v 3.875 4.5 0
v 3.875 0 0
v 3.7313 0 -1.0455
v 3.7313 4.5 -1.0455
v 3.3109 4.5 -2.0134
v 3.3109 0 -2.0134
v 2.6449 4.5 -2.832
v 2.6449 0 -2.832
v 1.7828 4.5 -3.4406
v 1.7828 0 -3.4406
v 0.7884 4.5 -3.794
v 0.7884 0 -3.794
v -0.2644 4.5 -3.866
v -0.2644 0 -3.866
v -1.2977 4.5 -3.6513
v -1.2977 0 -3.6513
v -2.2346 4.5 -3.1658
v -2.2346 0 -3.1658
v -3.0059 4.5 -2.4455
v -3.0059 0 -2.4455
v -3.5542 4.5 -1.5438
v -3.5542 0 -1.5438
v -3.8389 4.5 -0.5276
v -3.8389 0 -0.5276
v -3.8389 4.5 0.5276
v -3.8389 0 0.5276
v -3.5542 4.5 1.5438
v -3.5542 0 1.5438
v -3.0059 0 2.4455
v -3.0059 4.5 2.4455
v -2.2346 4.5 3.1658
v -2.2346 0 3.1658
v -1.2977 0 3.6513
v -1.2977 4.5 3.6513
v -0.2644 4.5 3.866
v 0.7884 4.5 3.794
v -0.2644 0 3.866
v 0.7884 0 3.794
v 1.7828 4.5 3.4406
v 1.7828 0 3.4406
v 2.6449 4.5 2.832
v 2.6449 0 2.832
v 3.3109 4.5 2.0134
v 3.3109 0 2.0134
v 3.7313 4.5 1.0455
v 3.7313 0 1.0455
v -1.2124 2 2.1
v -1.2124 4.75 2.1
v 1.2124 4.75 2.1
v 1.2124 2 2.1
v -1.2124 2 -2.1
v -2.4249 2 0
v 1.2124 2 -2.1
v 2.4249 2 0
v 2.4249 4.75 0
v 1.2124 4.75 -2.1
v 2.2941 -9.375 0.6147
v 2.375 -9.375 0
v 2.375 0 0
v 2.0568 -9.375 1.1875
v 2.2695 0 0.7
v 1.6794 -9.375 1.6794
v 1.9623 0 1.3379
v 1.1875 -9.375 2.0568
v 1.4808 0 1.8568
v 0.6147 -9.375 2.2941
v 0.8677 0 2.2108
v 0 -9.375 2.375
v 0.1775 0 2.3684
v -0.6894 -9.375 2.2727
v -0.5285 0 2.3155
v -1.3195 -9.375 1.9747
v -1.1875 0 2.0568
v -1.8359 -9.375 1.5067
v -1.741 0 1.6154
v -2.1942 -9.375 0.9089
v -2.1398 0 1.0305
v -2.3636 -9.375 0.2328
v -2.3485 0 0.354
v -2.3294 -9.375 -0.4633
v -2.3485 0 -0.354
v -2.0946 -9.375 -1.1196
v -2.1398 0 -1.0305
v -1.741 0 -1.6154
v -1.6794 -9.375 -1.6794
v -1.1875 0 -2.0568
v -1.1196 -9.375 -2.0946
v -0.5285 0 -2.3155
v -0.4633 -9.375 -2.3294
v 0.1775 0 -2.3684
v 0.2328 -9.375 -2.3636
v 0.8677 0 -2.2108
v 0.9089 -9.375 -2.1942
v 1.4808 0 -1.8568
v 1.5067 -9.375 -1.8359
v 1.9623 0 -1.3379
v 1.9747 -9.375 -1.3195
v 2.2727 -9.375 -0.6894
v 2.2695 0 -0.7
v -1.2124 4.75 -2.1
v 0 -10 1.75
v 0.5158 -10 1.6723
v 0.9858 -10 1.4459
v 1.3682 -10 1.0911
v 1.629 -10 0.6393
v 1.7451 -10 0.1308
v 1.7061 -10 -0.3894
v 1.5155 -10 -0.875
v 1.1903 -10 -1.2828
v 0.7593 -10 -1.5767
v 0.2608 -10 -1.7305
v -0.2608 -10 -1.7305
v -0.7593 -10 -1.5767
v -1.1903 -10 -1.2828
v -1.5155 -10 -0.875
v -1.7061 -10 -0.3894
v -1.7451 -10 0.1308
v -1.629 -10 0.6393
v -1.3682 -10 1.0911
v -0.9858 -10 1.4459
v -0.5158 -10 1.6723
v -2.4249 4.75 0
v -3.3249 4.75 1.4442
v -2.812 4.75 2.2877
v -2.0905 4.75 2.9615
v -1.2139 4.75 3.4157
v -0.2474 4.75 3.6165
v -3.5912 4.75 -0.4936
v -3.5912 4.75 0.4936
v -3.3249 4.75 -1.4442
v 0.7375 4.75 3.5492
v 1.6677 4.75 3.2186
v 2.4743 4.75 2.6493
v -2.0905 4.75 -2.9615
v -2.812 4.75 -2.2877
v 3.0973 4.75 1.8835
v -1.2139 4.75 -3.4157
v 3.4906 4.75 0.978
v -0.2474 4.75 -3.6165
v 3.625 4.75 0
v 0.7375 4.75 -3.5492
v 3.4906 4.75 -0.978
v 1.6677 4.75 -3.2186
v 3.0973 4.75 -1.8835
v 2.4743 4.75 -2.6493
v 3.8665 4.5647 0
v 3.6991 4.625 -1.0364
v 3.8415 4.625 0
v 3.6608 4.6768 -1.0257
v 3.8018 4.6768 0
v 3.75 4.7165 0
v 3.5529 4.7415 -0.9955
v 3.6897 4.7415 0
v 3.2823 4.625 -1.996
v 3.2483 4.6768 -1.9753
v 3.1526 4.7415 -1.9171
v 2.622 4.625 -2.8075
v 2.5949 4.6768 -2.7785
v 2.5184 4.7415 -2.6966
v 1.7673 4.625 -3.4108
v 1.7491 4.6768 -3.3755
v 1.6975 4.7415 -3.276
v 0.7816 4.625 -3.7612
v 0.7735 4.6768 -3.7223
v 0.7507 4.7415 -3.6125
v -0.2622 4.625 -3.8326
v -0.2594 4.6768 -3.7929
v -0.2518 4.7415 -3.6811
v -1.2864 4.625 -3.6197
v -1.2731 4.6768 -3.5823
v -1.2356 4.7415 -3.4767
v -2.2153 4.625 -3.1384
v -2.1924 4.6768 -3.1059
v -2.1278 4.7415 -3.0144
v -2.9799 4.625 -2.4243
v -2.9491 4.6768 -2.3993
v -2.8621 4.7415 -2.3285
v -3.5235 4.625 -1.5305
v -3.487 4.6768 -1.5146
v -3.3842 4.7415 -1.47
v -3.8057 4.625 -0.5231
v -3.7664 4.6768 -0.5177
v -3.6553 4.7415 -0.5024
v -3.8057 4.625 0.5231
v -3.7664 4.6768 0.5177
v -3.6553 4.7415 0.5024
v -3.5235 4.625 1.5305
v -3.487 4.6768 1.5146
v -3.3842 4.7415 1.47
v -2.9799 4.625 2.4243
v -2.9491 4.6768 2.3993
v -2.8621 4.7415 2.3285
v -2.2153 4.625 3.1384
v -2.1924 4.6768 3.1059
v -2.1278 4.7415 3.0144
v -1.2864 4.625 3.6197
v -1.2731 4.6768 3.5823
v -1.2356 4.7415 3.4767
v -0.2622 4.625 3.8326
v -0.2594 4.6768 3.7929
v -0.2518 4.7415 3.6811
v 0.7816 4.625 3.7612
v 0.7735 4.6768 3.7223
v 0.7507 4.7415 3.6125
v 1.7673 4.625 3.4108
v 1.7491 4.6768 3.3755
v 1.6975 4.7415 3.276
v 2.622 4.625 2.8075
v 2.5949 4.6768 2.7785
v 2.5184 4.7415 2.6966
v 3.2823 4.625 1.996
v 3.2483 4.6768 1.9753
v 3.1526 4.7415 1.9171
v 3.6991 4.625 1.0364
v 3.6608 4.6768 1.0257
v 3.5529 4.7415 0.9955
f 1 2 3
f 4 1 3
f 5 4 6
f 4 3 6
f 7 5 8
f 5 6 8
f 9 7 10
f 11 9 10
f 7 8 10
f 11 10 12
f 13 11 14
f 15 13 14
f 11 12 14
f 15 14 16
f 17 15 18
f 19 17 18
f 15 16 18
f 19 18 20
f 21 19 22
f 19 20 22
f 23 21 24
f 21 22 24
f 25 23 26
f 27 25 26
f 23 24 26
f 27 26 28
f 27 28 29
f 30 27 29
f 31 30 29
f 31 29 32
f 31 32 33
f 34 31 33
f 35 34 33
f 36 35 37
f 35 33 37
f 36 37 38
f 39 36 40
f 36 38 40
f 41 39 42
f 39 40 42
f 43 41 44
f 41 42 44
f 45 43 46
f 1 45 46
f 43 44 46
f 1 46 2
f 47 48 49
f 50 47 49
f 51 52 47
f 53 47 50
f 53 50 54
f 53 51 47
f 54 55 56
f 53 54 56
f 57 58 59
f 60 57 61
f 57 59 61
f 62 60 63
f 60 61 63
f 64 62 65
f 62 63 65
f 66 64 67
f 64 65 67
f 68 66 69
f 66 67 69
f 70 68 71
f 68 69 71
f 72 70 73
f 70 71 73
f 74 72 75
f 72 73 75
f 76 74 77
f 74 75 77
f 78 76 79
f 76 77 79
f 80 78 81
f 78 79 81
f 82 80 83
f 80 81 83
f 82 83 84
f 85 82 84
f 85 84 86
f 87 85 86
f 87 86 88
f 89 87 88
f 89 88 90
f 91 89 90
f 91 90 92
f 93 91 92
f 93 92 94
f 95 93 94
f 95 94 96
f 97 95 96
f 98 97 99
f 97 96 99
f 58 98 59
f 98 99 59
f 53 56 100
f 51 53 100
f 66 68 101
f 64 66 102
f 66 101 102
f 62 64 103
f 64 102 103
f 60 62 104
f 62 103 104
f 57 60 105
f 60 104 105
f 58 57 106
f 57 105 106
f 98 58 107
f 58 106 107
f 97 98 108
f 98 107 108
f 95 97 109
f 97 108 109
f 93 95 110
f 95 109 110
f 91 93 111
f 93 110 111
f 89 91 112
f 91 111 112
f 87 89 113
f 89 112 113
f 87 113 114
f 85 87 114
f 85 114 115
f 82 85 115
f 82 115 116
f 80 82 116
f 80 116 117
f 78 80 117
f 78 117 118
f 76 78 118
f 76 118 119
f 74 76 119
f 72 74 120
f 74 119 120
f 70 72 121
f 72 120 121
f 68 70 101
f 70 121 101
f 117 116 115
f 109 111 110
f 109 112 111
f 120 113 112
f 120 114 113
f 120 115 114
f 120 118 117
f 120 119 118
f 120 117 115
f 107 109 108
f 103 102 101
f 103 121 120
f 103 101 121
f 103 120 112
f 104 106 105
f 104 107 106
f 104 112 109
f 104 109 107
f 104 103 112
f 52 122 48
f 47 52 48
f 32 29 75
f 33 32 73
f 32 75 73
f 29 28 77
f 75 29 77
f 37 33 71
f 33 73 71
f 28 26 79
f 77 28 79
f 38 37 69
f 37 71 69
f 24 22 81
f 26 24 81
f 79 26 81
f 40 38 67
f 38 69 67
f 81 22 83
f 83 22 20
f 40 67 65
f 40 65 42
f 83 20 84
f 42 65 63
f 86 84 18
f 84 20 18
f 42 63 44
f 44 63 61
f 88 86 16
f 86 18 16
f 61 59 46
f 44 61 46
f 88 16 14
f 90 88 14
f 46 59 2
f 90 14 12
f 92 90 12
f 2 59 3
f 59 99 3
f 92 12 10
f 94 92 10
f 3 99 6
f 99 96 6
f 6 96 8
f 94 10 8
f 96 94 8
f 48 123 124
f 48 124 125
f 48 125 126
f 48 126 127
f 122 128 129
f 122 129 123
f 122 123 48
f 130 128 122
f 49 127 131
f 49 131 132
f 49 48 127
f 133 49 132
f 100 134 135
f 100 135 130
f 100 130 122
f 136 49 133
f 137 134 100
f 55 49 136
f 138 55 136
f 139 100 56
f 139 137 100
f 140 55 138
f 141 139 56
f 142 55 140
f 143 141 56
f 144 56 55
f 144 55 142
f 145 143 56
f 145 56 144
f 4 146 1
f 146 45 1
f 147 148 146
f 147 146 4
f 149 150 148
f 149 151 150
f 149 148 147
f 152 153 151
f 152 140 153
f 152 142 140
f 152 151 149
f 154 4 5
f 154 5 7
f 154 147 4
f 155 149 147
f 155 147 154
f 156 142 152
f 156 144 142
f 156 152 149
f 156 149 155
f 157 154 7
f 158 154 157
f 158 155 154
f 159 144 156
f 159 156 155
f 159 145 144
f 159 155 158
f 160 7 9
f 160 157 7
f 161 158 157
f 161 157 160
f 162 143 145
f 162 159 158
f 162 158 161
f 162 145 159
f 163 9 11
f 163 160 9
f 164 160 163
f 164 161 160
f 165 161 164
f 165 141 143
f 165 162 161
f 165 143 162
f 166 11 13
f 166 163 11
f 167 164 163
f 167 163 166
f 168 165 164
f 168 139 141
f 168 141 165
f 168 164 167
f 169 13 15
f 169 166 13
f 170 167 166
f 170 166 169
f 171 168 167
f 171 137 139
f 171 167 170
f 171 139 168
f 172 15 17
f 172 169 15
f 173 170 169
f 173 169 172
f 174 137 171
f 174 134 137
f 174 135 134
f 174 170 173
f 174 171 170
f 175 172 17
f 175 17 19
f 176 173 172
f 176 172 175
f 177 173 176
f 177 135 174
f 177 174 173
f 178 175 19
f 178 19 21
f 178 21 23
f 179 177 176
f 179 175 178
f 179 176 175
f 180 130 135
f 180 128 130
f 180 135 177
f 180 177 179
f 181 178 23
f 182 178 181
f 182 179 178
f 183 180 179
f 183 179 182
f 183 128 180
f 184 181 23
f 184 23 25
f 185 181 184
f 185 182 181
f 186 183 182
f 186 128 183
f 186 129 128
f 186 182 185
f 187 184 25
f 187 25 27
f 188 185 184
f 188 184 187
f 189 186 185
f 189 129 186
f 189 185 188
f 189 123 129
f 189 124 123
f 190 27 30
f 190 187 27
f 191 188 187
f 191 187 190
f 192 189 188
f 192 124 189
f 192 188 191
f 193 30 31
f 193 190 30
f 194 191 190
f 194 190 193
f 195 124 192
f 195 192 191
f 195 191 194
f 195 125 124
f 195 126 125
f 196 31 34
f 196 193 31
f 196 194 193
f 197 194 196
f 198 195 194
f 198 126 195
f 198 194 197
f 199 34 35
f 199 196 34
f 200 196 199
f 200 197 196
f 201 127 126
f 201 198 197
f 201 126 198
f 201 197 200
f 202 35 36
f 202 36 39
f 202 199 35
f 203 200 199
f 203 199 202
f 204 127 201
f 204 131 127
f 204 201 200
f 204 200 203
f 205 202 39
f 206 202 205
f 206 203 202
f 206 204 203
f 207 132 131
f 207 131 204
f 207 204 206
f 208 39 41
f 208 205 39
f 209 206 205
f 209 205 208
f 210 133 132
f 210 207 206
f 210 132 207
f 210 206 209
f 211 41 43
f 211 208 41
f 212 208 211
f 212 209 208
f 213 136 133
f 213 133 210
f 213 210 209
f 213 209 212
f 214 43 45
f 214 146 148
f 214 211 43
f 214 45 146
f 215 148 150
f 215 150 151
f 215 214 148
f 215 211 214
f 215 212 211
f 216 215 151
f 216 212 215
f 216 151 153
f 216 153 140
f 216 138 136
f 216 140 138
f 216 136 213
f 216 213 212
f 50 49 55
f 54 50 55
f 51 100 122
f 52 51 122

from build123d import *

# Parameters (mm, degrees)
SKETCH1_R           = 3.875
BOSS_EXTRUDE1_DEPTH = 4.75
FILLET1_R           = 0.25
CUT_EXTRUDE1_DEPTH  = 2.75
SKETCH3_R           = 2.375
BOSS_EXTRUDE2_DEPTH = 10


with BuildPart() as part:
    # Sketch1 → Boss-Extrude1 (new body)
    with BuildSketch(Plane(origin=(0, 0, 0), x_dir=(1, 0, 0), z_dir=(0, 1, 0))):
        Circle(SKETCH1_R)
    extrude(amount=BOSS_EXTRUDE1_DEPTH)

    # Fillet1
    fillet1_edges = [part.edges().sort_by_distance(p)[0] for p in [
        (-3.875, 4.75, 0),
    ]]
    fillet(fillet1_edges, radius=FILLET1_R)

    # Sketch2 → Cut-Extrude1 (cut)
    with BuildSketch(Plane(origin=(0, 4.75, 0), x_dir=(1, 0, 0), z_dir=(0, 1, 0))):
        Polygon((-2.424871131, 0), (-1.212435565, -2.1), (1.212435565, -2.1), (2.424871131, 0), (1.212435565, 2.1), (-1.212435565, 2.1), align=None)
    extrude(amount=-CUT_EXTRUDE1_DEPTH, mode=Mode.SUBTRACT)

    # Sketch3 → Boss-Extrude2 (add)
    with BuildSketch(Plane.XZ):
        Circle(SKETCH3_R)
    extrude(amount=BOSS_EXTRUDE2_DEPTH)

    # Sketch4 → Cut-Revolve1 (revolve, cut)
    with BuildSketch(Plane(origin=(0, 0, 0), x_dir=(0, 0, -1), z_dir=(1, 0, 0))):
        Polygon((-2.375, -10), (-2.375, -9.375), (-1.75, -10), align=None)
    revolve(axis=Axis((0, -10, 0), (0, 1, 0)), mode=Mode.SUBTRACT)


solid = part.part
